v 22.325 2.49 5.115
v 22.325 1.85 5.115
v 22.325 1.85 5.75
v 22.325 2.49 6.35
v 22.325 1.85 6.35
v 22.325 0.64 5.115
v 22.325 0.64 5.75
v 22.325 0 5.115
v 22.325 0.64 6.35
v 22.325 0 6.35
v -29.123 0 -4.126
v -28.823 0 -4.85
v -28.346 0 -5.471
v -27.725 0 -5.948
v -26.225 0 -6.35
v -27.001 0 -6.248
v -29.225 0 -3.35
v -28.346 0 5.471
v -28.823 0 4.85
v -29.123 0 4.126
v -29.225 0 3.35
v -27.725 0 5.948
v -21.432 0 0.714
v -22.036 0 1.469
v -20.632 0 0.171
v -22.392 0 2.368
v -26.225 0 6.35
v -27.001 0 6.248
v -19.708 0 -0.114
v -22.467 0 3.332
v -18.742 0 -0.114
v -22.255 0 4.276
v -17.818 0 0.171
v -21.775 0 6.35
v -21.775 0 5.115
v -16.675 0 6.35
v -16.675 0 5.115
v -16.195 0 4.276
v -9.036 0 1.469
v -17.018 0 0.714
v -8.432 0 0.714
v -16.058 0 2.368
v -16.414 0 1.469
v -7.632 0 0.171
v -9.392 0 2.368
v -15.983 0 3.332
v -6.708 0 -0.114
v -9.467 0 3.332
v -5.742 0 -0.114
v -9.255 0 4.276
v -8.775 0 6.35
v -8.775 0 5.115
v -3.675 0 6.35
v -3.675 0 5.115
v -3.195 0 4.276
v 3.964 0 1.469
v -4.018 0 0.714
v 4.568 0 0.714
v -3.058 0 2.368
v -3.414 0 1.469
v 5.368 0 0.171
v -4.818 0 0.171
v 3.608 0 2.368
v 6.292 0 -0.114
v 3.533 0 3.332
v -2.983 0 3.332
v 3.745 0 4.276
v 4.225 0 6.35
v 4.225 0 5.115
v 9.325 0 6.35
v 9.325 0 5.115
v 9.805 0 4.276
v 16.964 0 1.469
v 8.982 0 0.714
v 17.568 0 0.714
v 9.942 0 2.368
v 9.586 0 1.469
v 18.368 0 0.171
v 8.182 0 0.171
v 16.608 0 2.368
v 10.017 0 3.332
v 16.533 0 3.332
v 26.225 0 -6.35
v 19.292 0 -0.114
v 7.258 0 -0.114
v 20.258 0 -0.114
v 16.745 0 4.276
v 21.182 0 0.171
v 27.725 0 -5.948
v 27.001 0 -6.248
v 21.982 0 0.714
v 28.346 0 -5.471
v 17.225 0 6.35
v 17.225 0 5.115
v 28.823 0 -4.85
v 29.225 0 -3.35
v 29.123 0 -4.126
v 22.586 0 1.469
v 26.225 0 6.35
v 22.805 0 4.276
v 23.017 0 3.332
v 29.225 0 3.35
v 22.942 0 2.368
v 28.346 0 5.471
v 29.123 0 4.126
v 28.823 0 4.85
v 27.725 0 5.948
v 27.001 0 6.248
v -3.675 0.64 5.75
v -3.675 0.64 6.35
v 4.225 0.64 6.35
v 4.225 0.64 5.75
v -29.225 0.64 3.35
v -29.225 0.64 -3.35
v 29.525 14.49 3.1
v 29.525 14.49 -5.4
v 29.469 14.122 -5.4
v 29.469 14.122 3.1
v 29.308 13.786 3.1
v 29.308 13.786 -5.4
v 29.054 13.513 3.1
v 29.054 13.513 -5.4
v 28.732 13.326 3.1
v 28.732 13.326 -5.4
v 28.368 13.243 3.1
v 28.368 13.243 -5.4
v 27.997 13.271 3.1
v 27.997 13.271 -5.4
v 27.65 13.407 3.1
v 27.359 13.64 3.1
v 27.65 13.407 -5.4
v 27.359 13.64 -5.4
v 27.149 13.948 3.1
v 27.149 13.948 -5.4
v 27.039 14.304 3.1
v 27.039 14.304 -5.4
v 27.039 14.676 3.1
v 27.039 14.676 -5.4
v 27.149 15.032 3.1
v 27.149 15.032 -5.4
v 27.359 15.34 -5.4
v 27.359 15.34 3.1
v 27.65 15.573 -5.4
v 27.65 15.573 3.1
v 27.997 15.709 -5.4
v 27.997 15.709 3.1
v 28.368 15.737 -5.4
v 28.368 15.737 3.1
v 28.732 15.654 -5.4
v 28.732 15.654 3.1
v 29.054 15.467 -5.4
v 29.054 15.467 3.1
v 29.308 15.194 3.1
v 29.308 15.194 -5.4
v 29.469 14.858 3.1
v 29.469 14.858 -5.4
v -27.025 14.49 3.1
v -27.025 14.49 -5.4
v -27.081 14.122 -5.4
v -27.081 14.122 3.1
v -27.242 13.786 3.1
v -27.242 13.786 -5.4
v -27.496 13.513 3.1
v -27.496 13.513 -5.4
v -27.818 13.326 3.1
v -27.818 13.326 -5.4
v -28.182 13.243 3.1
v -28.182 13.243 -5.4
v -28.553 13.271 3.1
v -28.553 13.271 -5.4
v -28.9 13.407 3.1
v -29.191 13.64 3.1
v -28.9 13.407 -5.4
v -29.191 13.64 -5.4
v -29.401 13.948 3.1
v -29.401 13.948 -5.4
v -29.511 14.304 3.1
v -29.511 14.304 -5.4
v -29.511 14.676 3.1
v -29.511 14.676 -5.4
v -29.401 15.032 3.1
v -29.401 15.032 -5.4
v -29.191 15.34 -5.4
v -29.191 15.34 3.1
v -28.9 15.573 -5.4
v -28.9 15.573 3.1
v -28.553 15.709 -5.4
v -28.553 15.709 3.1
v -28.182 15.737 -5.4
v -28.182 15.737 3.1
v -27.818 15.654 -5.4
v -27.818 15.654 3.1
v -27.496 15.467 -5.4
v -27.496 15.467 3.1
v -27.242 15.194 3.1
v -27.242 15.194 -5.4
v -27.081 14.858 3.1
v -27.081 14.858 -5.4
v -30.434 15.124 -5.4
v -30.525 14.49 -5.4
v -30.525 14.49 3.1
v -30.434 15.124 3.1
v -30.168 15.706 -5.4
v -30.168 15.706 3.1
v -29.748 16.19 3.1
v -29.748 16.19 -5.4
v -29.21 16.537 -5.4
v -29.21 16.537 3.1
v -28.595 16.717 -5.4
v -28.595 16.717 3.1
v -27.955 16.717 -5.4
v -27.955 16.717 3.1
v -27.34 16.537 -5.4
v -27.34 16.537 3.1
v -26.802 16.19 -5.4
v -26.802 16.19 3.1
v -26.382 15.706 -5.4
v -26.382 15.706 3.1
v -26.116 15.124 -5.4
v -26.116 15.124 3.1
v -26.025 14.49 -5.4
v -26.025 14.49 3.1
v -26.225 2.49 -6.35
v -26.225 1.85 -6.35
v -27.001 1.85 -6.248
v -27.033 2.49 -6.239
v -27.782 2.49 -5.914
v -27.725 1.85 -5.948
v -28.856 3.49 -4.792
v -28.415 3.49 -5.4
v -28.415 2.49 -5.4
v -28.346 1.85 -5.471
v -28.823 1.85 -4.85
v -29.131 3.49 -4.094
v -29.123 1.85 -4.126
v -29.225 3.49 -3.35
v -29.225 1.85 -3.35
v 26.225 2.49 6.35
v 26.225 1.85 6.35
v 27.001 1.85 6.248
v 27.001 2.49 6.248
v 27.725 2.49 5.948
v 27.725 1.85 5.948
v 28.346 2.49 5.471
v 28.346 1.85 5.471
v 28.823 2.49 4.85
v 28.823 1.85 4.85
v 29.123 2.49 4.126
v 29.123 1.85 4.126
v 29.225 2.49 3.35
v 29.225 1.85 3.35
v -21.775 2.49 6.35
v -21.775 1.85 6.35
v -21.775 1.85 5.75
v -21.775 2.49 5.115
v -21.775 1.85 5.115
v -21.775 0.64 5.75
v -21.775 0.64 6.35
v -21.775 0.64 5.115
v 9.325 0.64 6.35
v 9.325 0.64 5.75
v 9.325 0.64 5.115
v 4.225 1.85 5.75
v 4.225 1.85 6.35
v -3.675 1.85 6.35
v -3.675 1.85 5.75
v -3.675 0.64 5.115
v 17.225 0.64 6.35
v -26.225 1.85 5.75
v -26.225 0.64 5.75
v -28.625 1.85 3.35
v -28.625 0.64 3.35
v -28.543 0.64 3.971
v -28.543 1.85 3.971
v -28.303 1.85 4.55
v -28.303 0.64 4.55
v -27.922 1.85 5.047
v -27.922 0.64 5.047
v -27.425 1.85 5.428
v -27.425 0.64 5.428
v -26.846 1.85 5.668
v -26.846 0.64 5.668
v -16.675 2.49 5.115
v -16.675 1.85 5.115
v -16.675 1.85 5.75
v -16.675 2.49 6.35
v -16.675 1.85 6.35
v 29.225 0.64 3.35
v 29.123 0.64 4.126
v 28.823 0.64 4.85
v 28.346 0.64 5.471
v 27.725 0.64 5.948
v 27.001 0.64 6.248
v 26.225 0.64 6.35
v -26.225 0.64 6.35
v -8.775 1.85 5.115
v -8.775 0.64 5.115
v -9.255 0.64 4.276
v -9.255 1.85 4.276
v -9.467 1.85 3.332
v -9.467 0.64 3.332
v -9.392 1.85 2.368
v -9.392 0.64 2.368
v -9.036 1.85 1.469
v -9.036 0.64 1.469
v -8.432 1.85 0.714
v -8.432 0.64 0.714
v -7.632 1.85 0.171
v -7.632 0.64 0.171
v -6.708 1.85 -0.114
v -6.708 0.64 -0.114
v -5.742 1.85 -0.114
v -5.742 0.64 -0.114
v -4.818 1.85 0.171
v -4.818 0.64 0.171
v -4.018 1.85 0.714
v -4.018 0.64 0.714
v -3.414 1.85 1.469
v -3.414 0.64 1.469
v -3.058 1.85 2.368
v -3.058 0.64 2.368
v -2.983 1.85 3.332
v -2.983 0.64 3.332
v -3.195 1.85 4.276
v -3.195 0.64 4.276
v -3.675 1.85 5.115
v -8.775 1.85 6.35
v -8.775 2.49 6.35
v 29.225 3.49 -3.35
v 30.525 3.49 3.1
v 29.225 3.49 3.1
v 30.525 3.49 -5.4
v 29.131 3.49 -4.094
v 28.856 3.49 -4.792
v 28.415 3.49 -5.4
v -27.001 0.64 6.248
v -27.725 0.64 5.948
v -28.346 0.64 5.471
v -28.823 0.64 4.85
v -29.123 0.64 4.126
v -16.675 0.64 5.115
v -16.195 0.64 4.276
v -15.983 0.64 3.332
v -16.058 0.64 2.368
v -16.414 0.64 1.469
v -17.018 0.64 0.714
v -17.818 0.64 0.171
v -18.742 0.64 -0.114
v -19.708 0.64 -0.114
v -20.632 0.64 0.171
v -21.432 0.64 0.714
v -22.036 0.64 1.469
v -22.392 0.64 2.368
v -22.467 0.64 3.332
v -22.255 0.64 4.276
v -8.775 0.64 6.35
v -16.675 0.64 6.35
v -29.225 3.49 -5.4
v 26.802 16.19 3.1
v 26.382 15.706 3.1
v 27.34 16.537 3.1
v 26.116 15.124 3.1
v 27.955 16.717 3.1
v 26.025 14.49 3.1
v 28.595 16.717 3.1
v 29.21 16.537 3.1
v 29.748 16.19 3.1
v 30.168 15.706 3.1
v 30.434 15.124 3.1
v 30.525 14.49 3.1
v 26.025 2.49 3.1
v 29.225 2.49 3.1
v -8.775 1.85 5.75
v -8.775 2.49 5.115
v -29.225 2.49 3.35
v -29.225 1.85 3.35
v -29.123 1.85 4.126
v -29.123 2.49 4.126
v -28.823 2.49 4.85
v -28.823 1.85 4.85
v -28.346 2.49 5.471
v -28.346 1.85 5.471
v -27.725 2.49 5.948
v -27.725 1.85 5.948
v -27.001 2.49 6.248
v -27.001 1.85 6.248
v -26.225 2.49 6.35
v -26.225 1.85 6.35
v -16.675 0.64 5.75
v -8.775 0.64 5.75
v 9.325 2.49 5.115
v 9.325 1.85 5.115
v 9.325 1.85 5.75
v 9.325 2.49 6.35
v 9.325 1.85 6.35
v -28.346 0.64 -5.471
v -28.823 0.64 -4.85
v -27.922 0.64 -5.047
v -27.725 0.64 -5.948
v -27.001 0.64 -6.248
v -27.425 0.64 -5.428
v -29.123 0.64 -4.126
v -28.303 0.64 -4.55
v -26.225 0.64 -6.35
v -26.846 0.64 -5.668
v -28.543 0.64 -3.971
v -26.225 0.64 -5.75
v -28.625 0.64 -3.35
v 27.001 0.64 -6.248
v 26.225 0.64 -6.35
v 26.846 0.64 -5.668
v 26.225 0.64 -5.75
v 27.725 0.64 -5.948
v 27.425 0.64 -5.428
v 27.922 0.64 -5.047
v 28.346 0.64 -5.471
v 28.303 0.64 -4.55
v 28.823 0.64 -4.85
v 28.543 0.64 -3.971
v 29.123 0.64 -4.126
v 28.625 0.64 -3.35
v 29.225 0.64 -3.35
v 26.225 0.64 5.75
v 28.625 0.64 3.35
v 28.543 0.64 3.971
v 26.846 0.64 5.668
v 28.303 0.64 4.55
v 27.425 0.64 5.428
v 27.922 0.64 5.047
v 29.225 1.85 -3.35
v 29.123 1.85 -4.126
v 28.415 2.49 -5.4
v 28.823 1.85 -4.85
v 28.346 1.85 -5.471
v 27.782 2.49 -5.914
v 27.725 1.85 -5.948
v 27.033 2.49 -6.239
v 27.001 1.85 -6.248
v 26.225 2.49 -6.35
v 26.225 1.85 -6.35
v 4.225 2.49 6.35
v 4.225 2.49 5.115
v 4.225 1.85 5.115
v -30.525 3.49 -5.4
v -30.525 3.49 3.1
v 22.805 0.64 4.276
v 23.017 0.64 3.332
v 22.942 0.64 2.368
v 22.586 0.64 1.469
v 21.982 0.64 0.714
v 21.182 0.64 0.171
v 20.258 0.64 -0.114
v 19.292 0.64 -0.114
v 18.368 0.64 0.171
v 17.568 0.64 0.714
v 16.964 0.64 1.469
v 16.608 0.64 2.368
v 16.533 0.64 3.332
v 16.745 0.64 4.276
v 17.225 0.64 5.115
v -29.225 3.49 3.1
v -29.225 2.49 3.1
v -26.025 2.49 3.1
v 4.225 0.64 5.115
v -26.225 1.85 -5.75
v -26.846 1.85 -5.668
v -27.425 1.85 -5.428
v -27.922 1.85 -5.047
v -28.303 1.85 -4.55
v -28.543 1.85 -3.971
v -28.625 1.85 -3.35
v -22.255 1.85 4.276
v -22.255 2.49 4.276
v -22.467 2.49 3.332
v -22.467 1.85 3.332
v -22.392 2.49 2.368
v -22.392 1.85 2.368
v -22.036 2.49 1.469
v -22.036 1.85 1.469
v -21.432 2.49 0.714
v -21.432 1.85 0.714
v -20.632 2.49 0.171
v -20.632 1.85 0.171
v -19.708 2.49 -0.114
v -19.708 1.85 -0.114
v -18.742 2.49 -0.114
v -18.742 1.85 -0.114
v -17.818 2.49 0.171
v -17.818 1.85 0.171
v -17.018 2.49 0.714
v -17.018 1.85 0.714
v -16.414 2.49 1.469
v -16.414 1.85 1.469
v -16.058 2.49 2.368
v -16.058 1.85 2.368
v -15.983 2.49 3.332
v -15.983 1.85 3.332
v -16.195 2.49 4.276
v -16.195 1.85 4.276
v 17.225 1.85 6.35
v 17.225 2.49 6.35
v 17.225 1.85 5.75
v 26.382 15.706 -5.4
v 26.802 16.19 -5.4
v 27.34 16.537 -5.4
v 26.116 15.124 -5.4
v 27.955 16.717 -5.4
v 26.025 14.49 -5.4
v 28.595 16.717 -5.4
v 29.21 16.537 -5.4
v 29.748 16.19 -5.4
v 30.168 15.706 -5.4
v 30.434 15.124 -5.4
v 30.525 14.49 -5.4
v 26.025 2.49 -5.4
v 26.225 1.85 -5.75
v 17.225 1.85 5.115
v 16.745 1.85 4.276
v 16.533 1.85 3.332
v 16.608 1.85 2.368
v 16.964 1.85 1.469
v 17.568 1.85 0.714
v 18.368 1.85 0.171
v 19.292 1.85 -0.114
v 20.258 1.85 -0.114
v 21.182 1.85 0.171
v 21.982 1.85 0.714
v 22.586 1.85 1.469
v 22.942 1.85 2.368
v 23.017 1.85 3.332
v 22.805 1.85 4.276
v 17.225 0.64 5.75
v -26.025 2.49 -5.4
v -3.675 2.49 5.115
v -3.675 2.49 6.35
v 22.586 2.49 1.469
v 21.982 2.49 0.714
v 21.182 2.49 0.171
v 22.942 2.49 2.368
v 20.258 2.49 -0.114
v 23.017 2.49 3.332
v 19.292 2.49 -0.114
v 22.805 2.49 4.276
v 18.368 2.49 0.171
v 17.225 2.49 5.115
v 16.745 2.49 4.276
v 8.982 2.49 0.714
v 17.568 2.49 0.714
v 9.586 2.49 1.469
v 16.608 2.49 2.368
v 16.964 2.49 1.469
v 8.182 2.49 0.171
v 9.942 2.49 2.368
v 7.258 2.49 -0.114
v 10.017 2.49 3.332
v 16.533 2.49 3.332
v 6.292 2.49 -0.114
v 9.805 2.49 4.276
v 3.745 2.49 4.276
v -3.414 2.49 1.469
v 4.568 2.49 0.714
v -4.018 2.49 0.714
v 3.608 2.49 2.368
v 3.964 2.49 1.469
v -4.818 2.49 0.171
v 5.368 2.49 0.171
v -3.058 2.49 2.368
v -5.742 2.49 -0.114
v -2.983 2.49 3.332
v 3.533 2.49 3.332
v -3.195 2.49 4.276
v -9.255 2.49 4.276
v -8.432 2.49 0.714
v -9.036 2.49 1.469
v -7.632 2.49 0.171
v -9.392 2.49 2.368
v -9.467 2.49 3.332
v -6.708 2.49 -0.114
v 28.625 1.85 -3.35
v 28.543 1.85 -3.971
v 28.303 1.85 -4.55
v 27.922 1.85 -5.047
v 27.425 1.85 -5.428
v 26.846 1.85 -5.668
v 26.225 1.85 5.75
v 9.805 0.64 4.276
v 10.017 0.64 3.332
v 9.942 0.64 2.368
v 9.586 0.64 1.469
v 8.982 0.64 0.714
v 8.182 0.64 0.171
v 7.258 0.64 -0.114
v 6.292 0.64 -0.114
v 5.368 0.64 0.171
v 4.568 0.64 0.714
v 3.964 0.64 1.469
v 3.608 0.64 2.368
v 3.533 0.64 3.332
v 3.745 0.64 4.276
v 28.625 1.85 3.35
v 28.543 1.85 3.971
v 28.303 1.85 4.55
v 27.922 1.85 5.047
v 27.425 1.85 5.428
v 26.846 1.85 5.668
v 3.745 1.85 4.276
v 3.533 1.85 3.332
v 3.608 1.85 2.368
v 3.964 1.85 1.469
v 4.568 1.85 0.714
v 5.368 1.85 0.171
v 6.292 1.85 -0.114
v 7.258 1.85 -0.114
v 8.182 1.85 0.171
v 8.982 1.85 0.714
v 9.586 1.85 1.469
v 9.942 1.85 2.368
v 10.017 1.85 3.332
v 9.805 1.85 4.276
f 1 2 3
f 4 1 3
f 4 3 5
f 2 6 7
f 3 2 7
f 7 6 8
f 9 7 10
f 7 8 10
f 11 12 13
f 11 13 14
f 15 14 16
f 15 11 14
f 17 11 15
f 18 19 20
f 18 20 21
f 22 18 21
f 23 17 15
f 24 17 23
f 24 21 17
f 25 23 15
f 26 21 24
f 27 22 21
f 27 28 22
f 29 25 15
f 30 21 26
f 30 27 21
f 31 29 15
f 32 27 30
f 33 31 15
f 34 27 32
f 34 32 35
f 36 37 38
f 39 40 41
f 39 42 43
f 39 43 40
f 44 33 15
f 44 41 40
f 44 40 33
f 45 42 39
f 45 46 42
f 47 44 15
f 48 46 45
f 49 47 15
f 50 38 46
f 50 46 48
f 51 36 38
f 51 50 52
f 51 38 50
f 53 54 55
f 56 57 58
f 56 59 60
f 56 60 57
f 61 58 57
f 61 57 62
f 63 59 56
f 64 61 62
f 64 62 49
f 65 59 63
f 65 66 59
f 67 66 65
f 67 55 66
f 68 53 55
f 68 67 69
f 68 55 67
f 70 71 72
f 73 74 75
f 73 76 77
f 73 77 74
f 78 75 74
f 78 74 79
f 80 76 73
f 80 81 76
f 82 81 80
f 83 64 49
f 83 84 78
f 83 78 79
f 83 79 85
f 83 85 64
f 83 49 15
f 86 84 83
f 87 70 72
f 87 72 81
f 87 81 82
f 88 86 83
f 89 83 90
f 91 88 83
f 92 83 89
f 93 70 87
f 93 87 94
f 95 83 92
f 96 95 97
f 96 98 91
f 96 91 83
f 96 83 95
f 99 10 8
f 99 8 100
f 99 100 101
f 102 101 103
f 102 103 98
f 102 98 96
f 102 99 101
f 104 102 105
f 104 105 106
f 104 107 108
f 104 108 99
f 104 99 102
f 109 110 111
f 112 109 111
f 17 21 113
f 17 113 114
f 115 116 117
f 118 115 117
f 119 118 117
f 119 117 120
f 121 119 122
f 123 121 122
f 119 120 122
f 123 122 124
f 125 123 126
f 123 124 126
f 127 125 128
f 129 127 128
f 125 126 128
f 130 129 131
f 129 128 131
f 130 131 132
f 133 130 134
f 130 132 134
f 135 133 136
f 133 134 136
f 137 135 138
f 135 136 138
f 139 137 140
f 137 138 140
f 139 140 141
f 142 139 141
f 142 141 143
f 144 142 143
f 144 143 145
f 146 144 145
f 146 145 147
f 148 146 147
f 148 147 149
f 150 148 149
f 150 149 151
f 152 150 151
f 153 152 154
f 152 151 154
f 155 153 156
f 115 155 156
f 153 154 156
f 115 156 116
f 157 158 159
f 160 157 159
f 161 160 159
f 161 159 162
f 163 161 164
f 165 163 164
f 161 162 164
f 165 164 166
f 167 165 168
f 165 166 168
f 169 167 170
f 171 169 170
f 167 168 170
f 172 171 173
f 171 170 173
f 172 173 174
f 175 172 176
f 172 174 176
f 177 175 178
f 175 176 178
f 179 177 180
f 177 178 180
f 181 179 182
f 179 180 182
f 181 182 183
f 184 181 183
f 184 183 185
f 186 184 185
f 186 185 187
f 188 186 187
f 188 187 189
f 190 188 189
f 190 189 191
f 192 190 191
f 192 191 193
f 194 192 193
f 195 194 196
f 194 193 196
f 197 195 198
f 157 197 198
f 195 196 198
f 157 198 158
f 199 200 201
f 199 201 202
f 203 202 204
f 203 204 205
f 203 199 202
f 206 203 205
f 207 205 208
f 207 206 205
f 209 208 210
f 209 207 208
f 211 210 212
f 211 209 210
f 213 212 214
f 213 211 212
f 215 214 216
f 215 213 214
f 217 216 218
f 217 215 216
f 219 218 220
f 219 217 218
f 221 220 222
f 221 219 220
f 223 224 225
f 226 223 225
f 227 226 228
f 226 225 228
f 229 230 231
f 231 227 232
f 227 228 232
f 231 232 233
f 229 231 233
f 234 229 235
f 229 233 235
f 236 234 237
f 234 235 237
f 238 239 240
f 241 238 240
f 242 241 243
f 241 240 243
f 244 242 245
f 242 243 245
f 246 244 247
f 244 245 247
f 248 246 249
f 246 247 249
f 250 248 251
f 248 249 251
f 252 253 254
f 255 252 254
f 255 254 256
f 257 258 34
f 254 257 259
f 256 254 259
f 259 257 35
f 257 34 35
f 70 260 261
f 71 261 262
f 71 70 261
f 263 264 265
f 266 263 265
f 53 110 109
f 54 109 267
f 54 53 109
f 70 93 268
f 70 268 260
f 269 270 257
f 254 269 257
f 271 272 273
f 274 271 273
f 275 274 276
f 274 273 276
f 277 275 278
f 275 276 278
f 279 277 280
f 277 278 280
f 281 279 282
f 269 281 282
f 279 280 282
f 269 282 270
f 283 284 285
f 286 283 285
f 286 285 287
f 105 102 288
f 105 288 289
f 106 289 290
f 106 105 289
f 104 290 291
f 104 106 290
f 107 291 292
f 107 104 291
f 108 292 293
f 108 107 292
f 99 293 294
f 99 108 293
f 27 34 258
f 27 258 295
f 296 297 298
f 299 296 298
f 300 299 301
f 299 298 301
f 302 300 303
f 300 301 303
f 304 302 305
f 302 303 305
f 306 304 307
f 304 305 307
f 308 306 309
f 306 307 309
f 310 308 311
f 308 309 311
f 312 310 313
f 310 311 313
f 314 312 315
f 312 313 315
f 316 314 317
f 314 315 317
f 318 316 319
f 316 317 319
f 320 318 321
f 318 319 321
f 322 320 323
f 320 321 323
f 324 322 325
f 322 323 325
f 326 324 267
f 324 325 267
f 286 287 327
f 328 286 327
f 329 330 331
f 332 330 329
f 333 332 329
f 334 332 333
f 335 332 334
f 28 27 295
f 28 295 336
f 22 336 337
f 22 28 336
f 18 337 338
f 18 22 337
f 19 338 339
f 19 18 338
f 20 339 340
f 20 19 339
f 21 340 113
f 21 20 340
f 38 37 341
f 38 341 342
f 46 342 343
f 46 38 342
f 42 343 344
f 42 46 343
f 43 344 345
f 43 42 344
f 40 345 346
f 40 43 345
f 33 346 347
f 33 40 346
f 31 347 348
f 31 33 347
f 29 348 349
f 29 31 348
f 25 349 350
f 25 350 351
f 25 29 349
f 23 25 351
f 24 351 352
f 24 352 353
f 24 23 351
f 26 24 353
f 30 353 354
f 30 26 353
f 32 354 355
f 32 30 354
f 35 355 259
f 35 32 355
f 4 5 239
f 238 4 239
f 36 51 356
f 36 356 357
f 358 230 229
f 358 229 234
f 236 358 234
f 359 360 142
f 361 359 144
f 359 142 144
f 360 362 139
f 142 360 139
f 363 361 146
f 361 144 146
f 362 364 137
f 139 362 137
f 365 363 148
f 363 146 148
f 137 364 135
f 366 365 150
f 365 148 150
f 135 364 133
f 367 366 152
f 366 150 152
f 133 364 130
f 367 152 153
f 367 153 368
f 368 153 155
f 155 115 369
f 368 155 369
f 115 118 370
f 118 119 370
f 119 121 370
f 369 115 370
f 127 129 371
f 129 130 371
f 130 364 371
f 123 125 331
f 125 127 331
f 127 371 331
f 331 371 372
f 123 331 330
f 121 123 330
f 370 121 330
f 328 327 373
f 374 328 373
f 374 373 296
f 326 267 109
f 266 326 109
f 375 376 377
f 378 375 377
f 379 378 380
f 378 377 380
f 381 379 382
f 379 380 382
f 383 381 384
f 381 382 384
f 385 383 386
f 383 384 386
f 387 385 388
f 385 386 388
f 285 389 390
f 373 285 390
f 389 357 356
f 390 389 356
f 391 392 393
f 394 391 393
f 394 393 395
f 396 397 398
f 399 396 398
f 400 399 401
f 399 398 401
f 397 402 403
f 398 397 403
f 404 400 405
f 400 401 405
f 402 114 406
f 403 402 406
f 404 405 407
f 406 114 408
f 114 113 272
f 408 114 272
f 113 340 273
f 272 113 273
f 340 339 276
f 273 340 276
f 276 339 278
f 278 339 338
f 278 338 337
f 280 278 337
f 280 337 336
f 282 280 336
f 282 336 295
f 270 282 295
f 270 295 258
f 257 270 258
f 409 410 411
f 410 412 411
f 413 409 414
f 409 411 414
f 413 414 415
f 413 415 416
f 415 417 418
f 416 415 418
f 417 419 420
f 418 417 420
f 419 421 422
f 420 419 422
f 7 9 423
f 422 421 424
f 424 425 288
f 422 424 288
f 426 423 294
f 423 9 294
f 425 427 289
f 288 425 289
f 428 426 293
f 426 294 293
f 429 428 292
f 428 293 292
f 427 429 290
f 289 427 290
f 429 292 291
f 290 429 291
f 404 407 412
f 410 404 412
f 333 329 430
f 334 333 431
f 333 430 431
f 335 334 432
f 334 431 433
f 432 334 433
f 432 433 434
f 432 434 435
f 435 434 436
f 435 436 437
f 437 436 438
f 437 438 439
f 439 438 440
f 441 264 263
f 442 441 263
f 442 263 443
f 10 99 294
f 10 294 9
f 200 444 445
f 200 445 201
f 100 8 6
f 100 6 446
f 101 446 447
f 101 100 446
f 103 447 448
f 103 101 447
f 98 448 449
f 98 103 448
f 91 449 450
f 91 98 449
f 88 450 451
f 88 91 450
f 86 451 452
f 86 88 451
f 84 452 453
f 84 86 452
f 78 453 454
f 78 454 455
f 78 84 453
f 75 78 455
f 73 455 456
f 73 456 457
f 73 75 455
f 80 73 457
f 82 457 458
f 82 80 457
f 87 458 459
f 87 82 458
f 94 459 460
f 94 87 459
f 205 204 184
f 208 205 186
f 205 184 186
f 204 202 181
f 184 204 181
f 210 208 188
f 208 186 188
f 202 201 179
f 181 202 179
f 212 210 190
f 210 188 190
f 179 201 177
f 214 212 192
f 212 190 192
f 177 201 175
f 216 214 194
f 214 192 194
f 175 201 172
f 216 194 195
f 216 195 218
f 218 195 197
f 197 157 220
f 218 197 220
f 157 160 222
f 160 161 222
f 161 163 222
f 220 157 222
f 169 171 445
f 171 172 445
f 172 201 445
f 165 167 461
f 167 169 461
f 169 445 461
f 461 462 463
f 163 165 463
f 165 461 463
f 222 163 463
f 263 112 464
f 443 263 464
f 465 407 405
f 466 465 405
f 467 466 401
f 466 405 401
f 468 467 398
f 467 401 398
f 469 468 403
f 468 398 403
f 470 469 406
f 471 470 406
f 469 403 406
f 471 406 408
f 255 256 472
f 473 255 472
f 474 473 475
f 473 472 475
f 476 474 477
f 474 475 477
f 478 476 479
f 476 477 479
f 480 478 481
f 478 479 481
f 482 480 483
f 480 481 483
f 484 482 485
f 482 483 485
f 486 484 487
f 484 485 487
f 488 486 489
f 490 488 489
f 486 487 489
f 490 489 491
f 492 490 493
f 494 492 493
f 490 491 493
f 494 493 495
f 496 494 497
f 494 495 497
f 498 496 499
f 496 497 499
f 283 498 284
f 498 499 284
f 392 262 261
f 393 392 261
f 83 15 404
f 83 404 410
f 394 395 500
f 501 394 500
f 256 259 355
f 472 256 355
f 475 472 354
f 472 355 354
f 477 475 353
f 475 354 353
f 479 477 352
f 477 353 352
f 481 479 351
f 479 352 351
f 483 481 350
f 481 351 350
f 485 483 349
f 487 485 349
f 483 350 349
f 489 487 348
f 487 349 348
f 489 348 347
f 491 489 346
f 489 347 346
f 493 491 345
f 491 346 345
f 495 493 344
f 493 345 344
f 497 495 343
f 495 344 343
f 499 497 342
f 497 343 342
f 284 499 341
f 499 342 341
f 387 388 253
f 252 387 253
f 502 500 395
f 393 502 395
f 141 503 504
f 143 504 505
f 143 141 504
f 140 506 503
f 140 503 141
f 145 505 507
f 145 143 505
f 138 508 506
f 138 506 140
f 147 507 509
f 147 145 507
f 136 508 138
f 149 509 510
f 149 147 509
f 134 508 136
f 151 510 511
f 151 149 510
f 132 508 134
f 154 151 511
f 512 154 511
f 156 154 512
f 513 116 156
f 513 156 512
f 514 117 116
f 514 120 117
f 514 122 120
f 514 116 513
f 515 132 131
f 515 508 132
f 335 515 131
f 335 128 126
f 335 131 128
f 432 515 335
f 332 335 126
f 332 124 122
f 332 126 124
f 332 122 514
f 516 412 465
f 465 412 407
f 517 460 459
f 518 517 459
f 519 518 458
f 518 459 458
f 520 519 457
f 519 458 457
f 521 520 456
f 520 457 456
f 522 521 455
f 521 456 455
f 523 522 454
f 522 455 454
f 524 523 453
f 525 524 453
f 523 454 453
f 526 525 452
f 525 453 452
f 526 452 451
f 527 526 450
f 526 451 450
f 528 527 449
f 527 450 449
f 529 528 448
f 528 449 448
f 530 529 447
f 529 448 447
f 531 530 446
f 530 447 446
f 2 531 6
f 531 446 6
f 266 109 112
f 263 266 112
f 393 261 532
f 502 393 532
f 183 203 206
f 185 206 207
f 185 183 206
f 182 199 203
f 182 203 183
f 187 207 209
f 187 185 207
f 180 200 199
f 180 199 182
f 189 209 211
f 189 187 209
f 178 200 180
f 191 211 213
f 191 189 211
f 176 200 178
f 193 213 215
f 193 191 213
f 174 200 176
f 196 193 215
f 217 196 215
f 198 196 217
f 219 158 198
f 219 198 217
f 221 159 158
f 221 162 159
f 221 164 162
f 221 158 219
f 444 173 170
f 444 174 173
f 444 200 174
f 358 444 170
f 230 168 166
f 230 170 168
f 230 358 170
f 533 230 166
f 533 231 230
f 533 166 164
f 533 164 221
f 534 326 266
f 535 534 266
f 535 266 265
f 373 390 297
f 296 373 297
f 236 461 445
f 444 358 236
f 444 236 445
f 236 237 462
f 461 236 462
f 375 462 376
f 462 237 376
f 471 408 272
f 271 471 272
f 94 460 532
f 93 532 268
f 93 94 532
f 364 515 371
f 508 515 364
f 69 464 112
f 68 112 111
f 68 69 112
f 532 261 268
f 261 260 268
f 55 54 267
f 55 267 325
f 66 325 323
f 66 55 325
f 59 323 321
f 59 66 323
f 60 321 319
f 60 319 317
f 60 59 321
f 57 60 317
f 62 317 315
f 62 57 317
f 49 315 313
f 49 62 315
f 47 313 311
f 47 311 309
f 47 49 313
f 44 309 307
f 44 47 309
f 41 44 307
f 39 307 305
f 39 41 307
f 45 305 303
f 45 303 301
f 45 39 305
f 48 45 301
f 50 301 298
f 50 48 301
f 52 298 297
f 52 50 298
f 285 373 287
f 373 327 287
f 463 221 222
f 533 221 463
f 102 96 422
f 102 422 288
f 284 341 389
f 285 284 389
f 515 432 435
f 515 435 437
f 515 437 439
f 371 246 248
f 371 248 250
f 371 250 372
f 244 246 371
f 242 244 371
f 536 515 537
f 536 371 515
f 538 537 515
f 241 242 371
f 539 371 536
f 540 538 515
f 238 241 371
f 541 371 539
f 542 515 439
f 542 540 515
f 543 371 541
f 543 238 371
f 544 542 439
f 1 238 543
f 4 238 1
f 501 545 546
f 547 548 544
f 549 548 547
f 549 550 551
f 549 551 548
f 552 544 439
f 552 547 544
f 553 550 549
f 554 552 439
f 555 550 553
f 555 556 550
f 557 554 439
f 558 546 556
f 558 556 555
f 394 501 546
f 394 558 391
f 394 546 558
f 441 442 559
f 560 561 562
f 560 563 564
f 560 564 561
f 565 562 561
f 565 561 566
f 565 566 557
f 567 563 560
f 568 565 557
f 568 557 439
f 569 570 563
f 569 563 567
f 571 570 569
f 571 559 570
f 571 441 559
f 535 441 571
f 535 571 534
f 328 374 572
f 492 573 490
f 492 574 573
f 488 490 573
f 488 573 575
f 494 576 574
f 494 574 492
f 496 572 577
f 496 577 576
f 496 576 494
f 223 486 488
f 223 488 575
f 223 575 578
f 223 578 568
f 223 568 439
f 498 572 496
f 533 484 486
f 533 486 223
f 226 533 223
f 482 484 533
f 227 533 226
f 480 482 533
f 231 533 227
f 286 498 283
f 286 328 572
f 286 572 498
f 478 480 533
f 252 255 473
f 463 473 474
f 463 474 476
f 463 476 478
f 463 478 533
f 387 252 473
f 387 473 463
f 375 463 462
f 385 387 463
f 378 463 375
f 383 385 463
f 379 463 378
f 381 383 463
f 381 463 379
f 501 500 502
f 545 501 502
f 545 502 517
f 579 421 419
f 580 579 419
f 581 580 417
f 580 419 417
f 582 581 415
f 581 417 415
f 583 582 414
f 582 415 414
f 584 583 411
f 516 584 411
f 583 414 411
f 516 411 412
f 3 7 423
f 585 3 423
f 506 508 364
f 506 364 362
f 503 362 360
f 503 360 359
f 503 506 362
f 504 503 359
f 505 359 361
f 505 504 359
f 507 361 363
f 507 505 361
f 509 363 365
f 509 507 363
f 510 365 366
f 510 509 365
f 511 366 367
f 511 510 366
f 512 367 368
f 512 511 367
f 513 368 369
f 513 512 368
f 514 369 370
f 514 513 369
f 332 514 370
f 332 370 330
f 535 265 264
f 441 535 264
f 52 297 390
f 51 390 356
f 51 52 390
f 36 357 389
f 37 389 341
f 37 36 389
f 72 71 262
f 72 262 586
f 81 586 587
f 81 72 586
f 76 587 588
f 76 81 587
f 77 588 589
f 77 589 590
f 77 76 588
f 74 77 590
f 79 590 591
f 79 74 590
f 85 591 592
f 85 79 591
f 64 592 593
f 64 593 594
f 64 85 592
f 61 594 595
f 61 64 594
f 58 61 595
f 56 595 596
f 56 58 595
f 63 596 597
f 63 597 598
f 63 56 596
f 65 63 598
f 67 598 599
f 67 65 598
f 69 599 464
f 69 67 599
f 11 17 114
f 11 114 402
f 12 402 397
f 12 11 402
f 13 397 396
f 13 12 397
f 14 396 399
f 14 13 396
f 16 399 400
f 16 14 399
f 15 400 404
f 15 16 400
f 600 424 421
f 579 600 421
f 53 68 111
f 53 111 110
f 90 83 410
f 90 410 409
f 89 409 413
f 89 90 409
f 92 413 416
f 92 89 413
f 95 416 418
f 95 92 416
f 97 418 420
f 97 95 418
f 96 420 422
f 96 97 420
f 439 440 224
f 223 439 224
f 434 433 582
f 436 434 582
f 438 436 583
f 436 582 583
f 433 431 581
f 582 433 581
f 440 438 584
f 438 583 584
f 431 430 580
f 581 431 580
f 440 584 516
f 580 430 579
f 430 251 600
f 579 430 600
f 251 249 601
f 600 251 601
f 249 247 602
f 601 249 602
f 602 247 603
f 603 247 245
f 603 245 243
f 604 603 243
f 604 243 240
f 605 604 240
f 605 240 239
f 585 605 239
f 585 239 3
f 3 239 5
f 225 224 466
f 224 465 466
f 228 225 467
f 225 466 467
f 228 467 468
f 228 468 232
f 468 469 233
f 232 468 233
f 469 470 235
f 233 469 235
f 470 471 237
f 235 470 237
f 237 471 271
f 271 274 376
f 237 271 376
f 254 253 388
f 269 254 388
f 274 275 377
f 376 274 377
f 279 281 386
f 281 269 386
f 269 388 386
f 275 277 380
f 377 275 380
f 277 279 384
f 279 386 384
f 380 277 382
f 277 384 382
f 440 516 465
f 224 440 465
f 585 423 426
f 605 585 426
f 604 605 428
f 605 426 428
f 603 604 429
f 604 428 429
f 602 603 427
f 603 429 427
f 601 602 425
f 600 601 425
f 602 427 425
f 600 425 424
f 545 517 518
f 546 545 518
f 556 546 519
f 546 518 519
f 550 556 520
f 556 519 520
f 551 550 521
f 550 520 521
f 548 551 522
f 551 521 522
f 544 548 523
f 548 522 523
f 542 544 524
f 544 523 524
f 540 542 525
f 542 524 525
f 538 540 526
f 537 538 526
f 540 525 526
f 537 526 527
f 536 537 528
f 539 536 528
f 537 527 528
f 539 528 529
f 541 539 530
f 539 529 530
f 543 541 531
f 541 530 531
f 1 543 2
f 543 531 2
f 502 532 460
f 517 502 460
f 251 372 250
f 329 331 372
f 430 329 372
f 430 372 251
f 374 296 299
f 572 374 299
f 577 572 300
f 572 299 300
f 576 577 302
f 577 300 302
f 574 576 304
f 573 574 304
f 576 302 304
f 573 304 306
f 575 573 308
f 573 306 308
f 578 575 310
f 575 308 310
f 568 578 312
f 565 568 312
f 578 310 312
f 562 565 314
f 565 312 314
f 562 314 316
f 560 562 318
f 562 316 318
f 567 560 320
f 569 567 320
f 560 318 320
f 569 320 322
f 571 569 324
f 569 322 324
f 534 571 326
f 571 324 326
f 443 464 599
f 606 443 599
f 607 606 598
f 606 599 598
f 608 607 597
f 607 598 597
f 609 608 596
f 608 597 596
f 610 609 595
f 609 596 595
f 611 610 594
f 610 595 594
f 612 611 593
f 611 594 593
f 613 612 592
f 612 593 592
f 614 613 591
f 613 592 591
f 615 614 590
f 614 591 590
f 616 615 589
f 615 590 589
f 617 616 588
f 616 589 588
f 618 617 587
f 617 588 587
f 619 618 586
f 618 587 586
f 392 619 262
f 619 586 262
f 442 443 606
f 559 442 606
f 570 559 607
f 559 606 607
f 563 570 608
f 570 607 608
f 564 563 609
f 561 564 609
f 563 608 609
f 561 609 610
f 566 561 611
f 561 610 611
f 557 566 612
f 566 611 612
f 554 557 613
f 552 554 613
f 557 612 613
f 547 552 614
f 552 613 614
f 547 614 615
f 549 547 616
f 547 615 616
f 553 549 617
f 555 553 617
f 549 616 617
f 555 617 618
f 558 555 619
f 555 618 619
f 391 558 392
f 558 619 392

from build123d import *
from build123d import SkipClean  # not in build123d's __all__

# Parameters (mm, degrees)
F1_DEPTH = 0.64
F3_DEPTH = 1.21
F5_DEPTH = 0.64
F7_R     = 1.25
F8_DEPTH = 8.5
F9_DEPTH = 1


# Not quite as in the source:
# - after a boolean that leaves OpenCascade's solid faulty, fix() repairs it


with BuildPart() as f1:
    # F0 (on Front) → F1 (new body)
    with BuildSketch(Plane.XZ):
        with BuildLine():
            ThreePointArc((-29.225, -3.35), (-28.3463203436, -5.4713203436), (-26.225, -6.35))
            Line((-26.225, -6.35), (26.225, -6.35))
            ThreePointArc((26.225, -6.35), (28.3463203436, -5.4713203436), (29.225, -3.35))
            Line((29.225, -3.35), (29.225, 3.35))
            ThreePointArc((29.225, 3.35), (28.3463203436, 5.4713203436), (26.225, 6.35))
            Line((26.225, 6.35), (22.325, 6.35))
            Line((22.325, 6.35), (22.325, 5.114944168))
            ThreePointArc((22.325, 5.114944168), (19.775, -0.15), (17.225, 5.114944168))
            Line((17.225, 5.114944168), (17.225, 6.35))
            Line((17.225, 6.35), (9.325, 6.35))
            Line((9.325, 6.35), (9.325, 5.114944168))
            ThreePointArc((9.325, 5.114944168), (6.775, -0.15), (4.225, 5.114944168))
            Line((4.225, 5.114944168), (4.225, 6.35))
            Line((4.225, 6.35), (-3.675, 6.35))
            Line((-3.675, 6.35), (-3.675, 5.114944168))
            ThreePointArc((-3.675, 5.114944168), (-6.225, -0.15), (-8.775, 5.114944168))
            Line((-8.775, 5.114944168), (-8.775, 6.35))
            Line((-8.775, 6.35), (-16.675, 6.35))
            Line((-16.675, 6.35), (-16.675, 5.114944168))
            ThreePointArc((-16.675, 5.114944168), (-19.225, -0.15), (-21.775, 5.114944168))
            Line((-21.775, 5.114944168), (-21.775, 6.35))
            Line((-21.775, 6.35), (-26.225, 6.35))
            ThreePointArc((-26.225, 6.35), (-28.3463203436, 5.4713203436), (-29.225, 3.35))
            Line((-29.225, 3.35), (-29.225, -3.35))
        make_face()
    extrude(amount=-F1_DEPTH)

    # F2 (on face) → F3 (join)
    with BuildSketch(Plane(origin=(0, 0.64, 0), x_dir=(-1, 0, 0), z_dir=(0, 1, 0))):
        with BuildLine():
            Line((-22.325, 5.114944168), (-22.325, 5.75))
            Line((-22.325, 5.75), (-26.225, 5.75))
            ThreePointArc((-26.225, 5.75), (-27.9220562748, 5.0470562748), (-28.625, 3.35))
            Line((-28.625, 3.35), (-28.625, -3.35))
            ThreePointArc((-28.625, -3.35), (-27.9220562748, -5.0470562748), (-26.225, -5.75))
            Line((-26.225, -5.75), (26.225, -5.75))
            ThreePointArc((26.225, -5.75), (27.9220562748, -5.0470562748), (28.625, -3.35))
            Line((28.625, -3.35), (28.625, 3.35))
            ThreePointArc((28.625, 3.35), (27.9220562748, 5.0470562748), (26.225, 5.75))
            Line((26.225, 5.75), (21.775, 5.75))
            Line((21.775, 5.75), (21.775, 5.114944168))
            ThreePointArc((21.775, 5.114944168), (19.225, -0.15), (16.675, 5.114944168))
            Line((16.675, 5.114944168), (16.675, 5.75))
            Line((16.675, 5.75), (8.775, 5.75))
            Line((8.775, 5.75), (8.775, 5.114944168))
            ThreePointArc((8.775, 5.114944168), (6.225, -0.15), (3.675, 5.114944168))
            Line((3.675, 5.114944168), (3.675, 5.75))
            Line((3.675, 5.75), (-4.225, 5.75))
            Line((-4.225, 5.75), (-4.225, 5.114944168))
            ThreePointArc((-4.225, 5.114944168), (-6.775, -0.15), (-9.325, 5.114944168))
            Line((-9.325, 5.114944168), (-9.325, 5.75))
            Line((-9.325, 5.75), (-17.225, 5.75))
            Line((-17.225, 5.75), (-17.225, 5.114944168))
            ThreePointArc((-17.225, 5.114944168), (-19.775, -0.15), (-22.325, 5.114944168))
        make_face()
    with SkipClean():  # cleaning this boolean's faces spoils the solid; the shape is the same uncleaned
        extrude(amount=F3_DEPTH)

    # F4 (on face) → F5 (join)
    with BuildSketch(Plane(origin=(0, 1.85, 0), x_dir=(-1, 0, 0), z_dir=(0, 1, 0))):
        with BuildLine():
            ThreePointArc((-29.225, -3.35), (-28.3463203436, -5.4713203436), (-26.225, -6.35))
            Line((-26.225, -6.35), (26.225, -6.35))
            ThreePointArc((26.225, -6.35), (28.3463203436, -5.4713203436), (29.225, -3.35))
            Line((29.225, -3.35), (29.225, 3.35))
            ThreePointArc((29.225, 3.35), (28.3463203436, 5.4713203436), (26.225, 6.35))
            Line((26.225, 6.35), (21.775, 6.35))
            Line((21.775, 6.35), (21.775, 5.114944168))
            ThreePointArc((21.775, 5.114944168), (19.225, -0.15), (16.675, 5.114944168))
            Line((16.675, 5.114944168), (16.675, 6.35))
            Line((16.675, 6.35), (8.775, 6.35))
            Line((8.775, 6.35), (8.775, 5.114944168))
            ThreePointArc((8.775, 5.114944168), (6.225, -0.15), (3.675, 5.114944168))
            Line((3.675, 5.114944168), (3.675, 6.35))
            Line((3.675, 6.35), (-4.225, 6.35))
            Line((-4.225, 6.35), (-4.225, 5.114944168))
            ThreePointArc((-4.225, 5.114944168), (-6.775, -0.15), (-9.325, 5.114944168))
            Line((-9.325, 5.114944168), (-9.325, 6.35))
            Line((-9.325, 6.35), (-17.225, 6.35))
            Line((-17.225, 6.35), (-17.225, 5.114944168))
            ThreePointArc((-17.225, 5.114944168), (-19.775, -0.15), (-22.325, 5.114944168))
            Line((-22.325, 5.114944168), (-22.325, 6.35))
            Line((-22.325, 6.35), (-26.225, 6.35))
            ThreePointArc((-26.225, 6.35), (-28.3463203436, 5.4713203436), (-29.225, 3.35))
            Line((-29.225, 3.35), (-29.225, -3.35))
        make_face()
    extrude(amount=F5_DEPTH)

    add(f1.part.fix(), mode=Mode.REPLACE)

    # F7 (on offset) → F8 (join)
    with BuildSketch(Plane(origin=(0, 0, -5.4), x_dir=(1, 0, 0), z_dir=(0, 0, -1))):
        with BuildLine():
            Line((29.225, -3.49), (29.225, -2.49))
            Line((29.225, -2.49), (26.025, -2.49))
            Line((26.025, -2.49), (26.025, -3.49))
            Line((26.025, -3.49), (26.025, -14.49))
            ThreePointArc((26.025, -14.49), (28.275, -16.74), (30.525, -14.49))
            Line((30.525, -14.49), (30.525, -3.49))
            Line((30.525, -3.49), (29.225, -3.49))
        make_face()
        with Locations((28.275, -14.49)):
            Circle(F7_R, mode=Mode.SUBTRACT)
        with BuildLine():
            Line((-26.025, -14.49), (-26.025, -3.49))
            Line((-26.025, -3.49), (-26.025, -2.49))
            Line((-26.025, -2.49), (-29.225, -2.49))
            Line((-29.225, -2.49), (-29.225, -3.49))
            Line((-29.225, -3.49), (-30.525, -3.49))
            Line((-30.525, -3.49), (-30.525, -14.49))
            ThreePointArc((-30.525, -14.49), (-28.275, -16.74), (-26.025, -14.49))
        make_face()
        with Locations((-28.275, -14.49)):
            Circle(F7_R, mode=Mode.SUBTRACT)
    extrude(amount=-F8_DEPTH)

    # F9 (cut): faces of the model
    f9_faces = [f1.faces().sort_by_distance(p)[0] for p in [
        (28.9889729085, 2.49, -4.9023634763),
        (-28.9889729085, 2.49, -4.9023634763),
    ]]
    extrude(f9_faces, amount=-F9_DEPTH, mode=Mode.SUBTRACT)


solid = f1.part
